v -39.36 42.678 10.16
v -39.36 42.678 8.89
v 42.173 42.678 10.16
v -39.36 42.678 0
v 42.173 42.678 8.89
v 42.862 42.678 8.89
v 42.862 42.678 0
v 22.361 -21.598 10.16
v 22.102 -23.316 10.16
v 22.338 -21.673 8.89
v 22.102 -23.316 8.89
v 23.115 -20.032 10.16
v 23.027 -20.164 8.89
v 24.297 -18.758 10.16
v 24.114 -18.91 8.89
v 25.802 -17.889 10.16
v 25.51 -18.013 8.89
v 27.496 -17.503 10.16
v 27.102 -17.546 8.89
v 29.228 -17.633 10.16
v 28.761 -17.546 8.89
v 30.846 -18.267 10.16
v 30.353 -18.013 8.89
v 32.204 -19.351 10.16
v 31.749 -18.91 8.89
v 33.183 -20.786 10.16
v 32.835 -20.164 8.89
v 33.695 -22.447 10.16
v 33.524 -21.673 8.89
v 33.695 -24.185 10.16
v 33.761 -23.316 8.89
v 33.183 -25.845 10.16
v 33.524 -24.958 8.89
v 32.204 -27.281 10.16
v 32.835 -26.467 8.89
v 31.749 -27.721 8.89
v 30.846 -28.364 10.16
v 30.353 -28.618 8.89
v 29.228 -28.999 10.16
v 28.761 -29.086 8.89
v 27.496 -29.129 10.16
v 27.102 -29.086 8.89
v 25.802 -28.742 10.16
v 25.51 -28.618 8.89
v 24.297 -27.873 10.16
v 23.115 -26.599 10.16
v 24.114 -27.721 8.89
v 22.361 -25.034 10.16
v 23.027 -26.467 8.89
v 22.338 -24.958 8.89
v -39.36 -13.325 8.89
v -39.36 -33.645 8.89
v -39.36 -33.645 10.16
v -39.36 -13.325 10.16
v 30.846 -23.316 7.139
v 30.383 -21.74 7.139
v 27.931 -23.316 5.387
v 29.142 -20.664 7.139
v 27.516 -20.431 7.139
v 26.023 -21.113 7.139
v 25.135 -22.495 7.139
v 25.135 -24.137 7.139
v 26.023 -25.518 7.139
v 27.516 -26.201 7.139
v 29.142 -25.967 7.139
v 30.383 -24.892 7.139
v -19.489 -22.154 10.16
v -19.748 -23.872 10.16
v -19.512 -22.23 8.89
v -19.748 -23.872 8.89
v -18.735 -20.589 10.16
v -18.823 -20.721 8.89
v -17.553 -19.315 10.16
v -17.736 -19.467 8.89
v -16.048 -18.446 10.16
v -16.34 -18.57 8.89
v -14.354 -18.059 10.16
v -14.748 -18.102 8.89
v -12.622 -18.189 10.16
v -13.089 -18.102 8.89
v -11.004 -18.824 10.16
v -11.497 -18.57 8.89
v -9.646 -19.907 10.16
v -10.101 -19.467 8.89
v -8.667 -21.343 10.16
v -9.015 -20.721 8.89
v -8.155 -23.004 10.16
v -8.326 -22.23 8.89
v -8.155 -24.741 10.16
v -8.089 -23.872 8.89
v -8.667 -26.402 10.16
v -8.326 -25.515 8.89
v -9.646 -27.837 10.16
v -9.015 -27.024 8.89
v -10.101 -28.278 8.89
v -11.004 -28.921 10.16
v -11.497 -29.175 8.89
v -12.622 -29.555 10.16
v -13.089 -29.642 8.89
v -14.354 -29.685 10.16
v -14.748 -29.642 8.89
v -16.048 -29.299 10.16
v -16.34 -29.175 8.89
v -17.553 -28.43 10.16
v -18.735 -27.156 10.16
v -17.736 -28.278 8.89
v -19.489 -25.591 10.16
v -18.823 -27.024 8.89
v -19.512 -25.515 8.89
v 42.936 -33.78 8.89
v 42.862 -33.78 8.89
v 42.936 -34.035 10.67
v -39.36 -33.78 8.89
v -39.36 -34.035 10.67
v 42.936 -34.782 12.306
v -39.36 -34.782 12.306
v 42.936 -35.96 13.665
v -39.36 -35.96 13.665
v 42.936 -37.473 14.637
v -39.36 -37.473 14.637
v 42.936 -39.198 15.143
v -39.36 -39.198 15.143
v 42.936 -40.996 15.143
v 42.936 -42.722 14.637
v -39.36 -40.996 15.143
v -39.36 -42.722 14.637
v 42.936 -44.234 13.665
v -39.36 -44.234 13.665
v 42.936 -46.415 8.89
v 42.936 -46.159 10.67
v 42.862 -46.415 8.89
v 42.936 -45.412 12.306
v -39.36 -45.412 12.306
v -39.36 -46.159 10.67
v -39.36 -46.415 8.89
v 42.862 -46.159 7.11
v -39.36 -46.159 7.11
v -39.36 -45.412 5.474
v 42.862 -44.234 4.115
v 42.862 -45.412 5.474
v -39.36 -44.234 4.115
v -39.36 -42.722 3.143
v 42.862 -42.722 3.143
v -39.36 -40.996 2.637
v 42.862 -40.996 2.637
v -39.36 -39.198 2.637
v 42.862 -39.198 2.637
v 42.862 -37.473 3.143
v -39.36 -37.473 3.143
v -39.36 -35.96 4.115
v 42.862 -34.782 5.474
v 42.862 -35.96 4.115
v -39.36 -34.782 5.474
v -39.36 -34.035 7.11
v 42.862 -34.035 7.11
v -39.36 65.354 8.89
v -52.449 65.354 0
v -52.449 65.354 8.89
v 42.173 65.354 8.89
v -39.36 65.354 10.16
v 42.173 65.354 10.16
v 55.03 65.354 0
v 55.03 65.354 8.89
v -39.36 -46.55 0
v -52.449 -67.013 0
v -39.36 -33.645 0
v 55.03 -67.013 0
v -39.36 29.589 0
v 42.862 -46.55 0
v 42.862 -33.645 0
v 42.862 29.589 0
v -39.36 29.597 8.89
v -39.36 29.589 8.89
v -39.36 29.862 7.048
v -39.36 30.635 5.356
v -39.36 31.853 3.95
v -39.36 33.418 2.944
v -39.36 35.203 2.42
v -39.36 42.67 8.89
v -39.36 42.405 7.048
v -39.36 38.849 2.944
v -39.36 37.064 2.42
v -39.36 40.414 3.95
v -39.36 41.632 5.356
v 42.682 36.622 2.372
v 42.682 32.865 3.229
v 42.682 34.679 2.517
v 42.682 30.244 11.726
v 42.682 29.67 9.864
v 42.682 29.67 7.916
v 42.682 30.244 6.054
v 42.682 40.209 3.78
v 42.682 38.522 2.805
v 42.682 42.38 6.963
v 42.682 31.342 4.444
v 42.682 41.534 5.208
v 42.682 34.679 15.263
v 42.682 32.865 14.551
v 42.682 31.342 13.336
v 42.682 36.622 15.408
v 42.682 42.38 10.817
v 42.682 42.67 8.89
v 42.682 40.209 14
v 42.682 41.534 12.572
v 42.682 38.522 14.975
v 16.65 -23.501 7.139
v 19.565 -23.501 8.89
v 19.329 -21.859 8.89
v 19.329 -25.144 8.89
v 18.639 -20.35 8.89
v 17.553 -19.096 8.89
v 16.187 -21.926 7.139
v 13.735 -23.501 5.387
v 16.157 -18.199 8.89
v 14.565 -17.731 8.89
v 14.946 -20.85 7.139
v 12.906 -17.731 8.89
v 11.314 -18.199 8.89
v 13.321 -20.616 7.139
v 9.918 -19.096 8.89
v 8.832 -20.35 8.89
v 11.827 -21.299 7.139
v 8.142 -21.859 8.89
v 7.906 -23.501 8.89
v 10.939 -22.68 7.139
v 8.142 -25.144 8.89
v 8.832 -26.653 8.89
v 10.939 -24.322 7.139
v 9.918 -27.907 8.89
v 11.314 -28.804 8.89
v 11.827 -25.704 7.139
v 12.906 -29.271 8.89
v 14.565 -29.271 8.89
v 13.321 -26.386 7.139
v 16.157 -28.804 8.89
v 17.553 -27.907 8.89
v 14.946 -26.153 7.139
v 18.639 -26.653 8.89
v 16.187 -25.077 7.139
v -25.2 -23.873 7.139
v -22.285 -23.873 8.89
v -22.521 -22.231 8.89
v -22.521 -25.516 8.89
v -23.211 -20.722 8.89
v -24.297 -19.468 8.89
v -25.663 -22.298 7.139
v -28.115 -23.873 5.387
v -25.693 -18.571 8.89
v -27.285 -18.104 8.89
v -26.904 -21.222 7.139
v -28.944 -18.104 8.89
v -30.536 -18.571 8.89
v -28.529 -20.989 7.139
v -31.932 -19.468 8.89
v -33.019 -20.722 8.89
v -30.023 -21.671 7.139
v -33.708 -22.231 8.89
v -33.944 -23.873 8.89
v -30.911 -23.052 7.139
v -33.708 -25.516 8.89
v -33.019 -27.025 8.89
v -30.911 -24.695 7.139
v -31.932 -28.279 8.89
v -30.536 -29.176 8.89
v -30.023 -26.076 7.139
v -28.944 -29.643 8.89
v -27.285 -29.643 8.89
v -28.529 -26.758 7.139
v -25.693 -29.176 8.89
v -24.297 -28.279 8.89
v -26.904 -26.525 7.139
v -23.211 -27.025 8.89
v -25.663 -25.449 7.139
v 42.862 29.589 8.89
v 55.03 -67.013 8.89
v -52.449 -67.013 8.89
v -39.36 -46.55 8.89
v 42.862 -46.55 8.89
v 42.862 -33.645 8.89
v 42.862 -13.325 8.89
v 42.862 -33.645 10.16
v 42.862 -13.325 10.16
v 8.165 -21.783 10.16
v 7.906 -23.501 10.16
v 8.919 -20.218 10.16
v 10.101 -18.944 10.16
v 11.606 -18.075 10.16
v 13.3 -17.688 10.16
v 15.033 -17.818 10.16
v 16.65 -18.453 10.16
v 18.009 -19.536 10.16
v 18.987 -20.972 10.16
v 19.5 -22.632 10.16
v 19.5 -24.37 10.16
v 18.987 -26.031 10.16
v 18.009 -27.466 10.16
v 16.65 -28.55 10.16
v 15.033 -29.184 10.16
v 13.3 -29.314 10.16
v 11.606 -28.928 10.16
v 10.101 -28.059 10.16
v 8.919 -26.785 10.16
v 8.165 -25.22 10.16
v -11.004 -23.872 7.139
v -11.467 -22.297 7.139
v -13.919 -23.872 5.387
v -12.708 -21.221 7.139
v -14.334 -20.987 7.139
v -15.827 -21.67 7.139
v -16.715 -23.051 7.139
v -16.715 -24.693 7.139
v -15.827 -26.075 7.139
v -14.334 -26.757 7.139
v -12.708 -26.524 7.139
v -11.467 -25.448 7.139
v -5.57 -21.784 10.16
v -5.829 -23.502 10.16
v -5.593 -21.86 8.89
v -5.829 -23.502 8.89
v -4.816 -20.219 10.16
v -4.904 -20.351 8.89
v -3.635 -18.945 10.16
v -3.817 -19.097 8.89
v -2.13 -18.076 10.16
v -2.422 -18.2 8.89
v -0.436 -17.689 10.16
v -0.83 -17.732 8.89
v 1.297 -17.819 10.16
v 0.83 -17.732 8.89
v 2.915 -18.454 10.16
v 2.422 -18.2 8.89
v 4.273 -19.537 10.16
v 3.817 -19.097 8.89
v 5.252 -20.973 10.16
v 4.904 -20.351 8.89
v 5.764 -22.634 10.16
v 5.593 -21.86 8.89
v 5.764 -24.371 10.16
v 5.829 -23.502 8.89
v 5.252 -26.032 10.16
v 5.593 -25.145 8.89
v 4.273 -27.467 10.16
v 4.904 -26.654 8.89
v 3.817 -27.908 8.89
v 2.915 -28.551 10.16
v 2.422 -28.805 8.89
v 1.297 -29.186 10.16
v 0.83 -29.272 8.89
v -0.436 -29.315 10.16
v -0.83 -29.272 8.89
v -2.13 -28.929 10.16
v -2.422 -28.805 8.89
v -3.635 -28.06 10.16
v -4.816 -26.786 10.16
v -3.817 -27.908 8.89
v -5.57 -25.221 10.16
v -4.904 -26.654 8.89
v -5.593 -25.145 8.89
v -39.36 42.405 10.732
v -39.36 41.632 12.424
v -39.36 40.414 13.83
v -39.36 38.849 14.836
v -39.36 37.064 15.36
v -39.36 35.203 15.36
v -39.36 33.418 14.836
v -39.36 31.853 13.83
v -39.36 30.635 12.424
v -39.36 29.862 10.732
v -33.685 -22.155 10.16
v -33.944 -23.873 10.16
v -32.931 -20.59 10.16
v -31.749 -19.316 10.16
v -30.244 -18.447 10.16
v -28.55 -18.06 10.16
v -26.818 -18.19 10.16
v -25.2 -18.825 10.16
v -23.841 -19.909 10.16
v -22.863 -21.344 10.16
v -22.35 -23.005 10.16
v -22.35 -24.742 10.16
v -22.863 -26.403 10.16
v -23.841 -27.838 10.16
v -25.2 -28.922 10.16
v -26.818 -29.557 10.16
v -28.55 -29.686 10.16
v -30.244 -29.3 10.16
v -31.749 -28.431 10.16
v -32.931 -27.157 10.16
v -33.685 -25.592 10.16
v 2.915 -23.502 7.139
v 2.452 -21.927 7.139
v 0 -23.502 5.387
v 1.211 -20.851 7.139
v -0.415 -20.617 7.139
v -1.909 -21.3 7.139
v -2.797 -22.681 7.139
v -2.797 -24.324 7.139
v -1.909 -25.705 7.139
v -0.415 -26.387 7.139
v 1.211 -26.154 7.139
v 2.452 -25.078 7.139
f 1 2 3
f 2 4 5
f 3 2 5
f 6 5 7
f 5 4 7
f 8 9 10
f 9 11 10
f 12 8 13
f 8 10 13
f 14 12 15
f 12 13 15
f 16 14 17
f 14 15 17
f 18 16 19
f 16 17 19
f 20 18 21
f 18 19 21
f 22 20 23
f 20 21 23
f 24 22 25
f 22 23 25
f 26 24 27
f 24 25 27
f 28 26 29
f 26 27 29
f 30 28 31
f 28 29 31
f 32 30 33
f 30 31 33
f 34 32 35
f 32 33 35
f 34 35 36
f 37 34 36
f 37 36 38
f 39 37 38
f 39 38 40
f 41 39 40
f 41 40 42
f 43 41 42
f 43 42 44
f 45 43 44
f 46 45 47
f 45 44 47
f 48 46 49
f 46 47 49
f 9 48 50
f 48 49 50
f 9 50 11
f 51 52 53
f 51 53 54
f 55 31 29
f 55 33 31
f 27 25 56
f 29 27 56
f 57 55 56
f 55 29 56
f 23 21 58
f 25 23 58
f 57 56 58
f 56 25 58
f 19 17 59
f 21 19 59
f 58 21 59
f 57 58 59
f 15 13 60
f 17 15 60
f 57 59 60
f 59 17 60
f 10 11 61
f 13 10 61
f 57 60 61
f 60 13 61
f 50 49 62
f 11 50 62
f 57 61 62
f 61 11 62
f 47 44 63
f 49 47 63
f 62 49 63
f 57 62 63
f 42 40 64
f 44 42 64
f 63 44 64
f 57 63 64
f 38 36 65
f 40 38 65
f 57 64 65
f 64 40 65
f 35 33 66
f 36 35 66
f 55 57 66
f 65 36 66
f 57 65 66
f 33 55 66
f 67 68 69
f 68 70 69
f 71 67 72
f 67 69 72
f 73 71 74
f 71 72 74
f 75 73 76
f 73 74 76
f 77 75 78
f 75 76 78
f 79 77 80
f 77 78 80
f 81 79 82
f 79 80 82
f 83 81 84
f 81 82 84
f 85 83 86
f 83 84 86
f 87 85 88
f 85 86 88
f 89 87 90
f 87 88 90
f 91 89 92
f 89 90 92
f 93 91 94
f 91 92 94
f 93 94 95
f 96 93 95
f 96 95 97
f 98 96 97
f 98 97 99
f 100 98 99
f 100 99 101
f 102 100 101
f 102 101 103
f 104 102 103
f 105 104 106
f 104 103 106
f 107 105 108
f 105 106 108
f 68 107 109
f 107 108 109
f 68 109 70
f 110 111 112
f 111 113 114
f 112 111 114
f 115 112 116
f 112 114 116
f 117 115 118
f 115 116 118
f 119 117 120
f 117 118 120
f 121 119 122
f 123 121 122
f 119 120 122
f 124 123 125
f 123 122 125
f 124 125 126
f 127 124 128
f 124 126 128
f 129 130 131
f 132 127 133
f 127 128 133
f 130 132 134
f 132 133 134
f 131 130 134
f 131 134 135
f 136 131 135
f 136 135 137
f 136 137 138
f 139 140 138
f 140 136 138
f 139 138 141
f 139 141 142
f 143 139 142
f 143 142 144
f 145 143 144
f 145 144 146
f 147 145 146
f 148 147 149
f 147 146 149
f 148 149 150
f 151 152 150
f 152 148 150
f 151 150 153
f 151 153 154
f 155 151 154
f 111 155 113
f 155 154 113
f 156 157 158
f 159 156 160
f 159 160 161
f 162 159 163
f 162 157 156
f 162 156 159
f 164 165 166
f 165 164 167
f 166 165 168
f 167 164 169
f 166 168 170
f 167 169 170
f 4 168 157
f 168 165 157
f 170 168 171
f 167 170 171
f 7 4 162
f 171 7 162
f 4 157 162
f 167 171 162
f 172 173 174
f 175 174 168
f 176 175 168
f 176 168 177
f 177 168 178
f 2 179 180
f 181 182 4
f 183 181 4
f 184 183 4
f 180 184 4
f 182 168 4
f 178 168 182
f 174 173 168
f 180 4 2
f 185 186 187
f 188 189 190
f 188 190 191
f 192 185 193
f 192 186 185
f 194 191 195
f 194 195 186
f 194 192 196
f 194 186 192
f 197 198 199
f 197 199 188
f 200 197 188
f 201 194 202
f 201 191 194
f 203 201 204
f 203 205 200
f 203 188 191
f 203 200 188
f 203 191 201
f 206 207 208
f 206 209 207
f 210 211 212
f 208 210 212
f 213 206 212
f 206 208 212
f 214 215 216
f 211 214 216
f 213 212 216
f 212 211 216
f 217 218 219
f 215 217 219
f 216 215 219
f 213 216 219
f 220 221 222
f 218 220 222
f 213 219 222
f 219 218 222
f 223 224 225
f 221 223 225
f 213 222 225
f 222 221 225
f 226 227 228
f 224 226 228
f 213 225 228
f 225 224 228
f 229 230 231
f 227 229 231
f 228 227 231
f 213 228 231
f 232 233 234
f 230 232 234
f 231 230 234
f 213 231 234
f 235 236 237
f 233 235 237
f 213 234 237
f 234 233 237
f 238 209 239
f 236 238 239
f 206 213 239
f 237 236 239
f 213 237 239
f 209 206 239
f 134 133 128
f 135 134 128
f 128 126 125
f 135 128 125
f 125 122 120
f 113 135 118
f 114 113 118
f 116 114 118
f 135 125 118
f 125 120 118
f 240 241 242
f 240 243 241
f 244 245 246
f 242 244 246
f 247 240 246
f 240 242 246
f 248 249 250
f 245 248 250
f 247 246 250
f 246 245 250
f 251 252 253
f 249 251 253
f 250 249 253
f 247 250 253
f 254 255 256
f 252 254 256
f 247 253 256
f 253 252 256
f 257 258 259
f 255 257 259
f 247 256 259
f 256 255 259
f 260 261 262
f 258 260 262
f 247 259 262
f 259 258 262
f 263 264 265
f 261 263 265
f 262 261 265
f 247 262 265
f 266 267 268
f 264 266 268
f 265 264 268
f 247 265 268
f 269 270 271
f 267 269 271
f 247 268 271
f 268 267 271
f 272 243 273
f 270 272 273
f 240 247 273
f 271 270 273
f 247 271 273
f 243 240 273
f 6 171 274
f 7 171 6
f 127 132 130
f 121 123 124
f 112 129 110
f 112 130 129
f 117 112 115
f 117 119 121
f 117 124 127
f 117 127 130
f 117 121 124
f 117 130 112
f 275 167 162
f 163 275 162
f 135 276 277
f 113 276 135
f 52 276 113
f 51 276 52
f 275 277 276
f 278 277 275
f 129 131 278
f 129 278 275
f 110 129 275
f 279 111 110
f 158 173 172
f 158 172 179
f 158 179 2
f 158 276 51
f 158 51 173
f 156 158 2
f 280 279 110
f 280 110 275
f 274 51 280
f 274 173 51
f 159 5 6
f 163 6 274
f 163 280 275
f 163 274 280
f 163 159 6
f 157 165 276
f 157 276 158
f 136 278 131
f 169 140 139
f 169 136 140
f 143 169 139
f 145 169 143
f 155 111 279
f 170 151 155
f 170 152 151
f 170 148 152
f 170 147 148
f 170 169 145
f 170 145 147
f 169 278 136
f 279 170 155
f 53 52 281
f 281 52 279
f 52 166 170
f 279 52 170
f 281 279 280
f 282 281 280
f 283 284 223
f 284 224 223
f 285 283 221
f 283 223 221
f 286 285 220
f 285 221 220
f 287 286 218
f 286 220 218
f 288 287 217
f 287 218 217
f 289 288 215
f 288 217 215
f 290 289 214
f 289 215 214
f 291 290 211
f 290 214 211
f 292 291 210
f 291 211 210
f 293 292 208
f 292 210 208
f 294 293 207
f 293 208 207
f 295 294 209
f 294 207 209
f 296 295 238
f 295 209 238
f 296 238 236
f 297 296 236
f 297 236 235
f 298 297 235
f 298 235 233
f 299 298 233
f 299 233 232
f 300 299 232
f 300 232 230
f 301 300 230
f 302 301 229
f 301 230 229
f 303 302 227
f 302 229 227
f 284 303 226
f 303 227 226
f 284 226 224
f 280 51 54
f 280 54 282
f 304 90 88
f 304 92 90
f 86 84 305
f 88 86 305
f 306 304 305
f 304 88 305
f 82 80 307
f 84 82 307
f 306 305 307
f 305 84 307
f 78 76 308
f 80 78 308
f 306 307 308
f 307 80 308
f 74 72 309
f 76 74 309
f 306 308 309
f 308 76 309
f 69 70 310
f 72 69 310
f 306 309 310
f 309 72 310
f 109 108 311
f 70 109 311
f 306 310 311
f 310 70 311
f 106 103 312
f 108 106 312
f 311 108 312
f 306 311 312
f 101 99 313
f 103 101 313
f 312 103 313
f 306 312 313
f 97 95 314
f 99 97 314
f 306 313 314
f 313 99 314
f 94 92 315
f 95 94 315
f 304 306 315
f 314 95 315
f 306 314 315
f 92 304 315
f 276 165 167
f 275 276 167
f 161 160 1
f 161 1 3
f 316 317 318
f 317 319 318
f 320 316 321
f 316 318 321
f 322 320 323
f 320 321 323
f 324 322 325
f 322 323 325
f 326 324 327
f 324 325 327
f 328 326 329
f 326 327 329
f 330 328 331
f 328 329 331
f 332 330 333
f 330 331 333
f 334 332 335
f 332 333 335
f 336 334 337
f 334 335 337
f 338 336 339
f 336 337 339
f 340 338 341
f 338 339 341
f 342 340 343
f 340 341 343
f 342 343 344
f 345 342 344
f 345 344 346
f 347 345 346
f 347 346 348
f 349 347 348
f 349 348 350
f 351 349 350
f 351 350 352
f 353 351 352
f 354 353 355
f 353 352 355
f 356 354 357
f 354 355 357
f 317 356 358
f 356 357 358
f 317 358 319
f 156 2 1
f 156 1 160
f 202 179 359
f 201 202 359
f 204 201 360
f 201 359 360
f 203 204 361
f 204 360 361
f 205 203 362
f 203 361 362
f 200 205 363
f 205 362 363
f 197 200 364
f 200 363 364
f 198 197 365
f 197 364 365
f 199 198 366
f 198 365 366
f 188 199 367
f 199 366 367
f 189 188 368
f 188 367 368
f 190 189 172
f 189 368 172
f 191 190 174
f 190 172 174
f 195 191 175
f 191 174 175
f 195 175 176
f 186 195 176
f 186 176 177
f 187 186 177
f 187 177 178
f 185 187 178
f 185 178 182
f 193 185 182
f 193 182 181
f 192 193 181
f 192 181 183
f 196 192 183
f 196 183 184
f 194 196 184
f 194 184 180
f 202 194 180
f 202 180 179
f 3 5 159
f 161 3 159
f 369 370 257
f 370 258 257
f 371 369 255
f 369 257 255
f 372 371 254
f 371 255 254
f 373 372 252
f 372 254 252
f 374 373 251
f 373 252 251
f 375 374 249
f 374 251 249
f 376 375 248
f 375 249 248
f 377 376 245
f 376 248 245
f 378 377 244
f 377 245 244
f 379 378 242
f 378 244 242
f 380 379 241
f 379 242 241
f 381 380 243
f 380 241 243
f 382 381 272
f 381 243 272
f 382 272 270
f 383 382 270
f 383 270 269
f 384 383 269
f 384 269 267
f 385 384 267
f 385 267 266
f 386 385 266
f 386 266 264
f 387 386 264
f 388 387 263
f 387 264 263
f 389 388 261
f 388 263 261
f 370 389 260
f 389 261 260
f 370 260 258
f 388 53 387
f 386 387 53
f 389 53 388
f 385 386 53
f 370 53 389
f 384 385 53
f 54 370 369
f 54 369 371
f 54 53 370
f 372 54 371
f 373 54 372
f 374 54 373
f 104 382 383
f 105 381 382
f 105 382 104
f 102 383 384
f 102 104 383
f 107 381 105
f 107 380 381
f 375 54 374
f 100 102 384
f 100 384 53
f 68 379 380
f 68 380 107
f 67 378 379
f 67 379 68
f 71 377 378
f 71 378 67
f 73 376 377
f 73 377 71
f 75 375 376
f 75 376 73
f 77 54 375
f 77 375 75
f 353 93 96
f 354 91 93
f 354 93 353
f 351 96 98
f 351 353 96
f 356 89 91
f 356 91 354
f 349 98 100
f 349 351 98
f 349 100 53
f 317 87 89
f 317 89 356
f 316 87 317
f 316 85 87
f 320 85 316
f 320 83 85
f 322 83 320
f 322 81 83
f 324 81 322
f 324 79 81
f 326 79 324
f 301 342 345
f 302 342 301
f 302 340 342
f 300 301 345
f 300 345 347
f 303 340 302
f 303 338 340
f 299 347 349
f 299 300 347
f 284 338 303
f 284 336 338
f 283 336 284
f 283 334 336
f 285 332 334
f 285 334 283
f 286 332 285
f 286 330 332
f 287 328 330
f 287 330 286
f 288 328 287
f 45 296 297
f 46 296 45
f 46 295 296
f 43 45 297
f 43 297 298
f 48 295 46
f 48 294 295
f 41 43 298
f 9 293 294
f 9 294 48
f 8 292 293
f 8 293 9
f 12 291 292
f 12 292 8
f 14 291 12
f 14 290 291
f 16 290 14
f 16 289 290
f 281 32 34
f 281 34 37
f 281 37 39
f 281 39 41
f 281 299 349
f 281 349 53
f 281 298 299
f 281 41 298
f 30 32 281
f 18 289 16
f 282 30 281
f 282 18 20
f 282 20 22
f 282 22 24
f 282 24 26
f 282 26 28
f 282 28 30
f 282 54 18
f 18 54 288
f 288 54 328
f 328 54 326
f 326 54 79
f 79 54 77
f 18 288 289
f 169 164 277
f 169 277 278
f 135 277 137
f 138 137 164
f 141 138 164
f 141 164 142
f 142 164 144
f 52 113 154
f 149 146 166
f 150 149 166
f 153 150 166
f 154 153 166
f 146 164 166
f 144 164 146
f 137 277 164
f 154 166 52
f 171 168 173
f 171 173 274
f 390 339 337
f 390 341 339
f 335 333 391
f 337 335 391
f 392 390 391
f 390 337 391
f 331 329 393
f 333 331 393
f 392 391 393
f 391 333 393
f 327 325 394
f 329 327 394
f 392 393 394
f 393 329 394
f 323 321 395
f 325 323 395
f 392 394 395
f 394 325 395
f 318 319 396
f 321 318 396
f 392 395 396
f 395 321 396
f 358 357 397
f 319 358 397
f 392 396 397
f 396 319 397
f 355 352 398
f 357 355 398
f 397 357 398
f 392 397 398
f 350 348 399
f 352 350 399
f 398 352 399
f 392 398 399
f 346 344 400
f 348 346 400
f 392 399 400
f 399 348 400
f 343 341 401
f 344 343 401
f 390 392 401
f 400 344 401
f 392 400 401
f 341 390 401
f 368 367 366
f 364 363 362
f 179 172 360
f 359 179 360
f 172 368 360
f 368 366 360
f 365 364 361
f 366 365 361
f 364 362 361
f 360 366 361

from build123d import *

# Parameters (mm, degrees)
F0_W     = 107.4788756669
F0_H     = 132.3667764664
F0_W_2   = 82.2222568095
F0_H_2   = 12.9048414528
F0_H_3   = 13.0891911685
F1_DEPTH = 8.89
F2_R     = 6.5365620237
F3_DEPTH = 82.042
F4_R     = 6.3176265204
F5_DEPTH = 82.296
F6_W     = 81.5332569182
F6_H     = 22.6756446064
F6_W_2   = 82.2222568095
F6_H_2   = 20.3202562407
F7_DEPTH = 1.27
F9_D     = 11.6586
F9_DEPTH = 1.27
F9_TIP   = 3.5025968065


with BuildPart() as f1:
    # F0 (on Top) → F1 (new body)
    with BuildSketch(Plane.XY):
        with Locations((1.2904834002, -0.8295997977)):
            Rectangle(F0_W, F0_H)
        with Locations((1.7513688654, -40.0971788913)):
            Rectangle(F0_W_2, F0_H_2, mode=Mode.SUBTRACT)
        with Locations((1.7513688654, 36.1335482448)):
            Rectangle(F0_W_2, F0_H_3, mode=Mode.SUBTRACT)
    extrude(amount=F1_DEPTH)

    # F2 (on face) → F3 (join)
    with BuildSketch(Plane.YZ.offset(-39.3597595394)):
        with Locations((36.1335482448, 8.89)):
            Circle(F2_R)
    extrude(amount=F3_DEPTH)

    # F4 (on face) → F5 (join)
    with BuildSketch(Plane.YZ.offset(-39.3597595394)):
        with Locations((-40.0971788913, 8.89)):
            Circle(F4_R)
    extrude(amount=F5_DEPTH)

    # F6 (on face) → F7 (join)
    with BuildSketch(Plane.XY.offset(8.89)):
        with Locations((1.4068689197, 54.0159661323)):
            Rectangle(F6_W, F6_H)
        with Locations((1.7513688654, -23.4846300445)):
            Rectangle(F6_W_2, F6_H_2)
    extrude(amount=F7_DEPTH)

    # F9
    with Locations(Plane.XY.offset(10.16)):
        with Locations((-13.9187742025, -23.8723475486), (0, -23.5024150461), (13.735441491, -23.5012937337), (27.9312729836, -23.3157351613), (-28.114663437, -23.8734837621)):
            Hole(F9_D / 2, depth=F9_DEPTH)
            with Locations((0, 0, -(F9_DEPTH + F9_TIP / 2))):  # 118° drill point
                Cone(0, F9_D / 2, F9_TIP, mode=Mode.SUBTRACT)


solid = f1.part
